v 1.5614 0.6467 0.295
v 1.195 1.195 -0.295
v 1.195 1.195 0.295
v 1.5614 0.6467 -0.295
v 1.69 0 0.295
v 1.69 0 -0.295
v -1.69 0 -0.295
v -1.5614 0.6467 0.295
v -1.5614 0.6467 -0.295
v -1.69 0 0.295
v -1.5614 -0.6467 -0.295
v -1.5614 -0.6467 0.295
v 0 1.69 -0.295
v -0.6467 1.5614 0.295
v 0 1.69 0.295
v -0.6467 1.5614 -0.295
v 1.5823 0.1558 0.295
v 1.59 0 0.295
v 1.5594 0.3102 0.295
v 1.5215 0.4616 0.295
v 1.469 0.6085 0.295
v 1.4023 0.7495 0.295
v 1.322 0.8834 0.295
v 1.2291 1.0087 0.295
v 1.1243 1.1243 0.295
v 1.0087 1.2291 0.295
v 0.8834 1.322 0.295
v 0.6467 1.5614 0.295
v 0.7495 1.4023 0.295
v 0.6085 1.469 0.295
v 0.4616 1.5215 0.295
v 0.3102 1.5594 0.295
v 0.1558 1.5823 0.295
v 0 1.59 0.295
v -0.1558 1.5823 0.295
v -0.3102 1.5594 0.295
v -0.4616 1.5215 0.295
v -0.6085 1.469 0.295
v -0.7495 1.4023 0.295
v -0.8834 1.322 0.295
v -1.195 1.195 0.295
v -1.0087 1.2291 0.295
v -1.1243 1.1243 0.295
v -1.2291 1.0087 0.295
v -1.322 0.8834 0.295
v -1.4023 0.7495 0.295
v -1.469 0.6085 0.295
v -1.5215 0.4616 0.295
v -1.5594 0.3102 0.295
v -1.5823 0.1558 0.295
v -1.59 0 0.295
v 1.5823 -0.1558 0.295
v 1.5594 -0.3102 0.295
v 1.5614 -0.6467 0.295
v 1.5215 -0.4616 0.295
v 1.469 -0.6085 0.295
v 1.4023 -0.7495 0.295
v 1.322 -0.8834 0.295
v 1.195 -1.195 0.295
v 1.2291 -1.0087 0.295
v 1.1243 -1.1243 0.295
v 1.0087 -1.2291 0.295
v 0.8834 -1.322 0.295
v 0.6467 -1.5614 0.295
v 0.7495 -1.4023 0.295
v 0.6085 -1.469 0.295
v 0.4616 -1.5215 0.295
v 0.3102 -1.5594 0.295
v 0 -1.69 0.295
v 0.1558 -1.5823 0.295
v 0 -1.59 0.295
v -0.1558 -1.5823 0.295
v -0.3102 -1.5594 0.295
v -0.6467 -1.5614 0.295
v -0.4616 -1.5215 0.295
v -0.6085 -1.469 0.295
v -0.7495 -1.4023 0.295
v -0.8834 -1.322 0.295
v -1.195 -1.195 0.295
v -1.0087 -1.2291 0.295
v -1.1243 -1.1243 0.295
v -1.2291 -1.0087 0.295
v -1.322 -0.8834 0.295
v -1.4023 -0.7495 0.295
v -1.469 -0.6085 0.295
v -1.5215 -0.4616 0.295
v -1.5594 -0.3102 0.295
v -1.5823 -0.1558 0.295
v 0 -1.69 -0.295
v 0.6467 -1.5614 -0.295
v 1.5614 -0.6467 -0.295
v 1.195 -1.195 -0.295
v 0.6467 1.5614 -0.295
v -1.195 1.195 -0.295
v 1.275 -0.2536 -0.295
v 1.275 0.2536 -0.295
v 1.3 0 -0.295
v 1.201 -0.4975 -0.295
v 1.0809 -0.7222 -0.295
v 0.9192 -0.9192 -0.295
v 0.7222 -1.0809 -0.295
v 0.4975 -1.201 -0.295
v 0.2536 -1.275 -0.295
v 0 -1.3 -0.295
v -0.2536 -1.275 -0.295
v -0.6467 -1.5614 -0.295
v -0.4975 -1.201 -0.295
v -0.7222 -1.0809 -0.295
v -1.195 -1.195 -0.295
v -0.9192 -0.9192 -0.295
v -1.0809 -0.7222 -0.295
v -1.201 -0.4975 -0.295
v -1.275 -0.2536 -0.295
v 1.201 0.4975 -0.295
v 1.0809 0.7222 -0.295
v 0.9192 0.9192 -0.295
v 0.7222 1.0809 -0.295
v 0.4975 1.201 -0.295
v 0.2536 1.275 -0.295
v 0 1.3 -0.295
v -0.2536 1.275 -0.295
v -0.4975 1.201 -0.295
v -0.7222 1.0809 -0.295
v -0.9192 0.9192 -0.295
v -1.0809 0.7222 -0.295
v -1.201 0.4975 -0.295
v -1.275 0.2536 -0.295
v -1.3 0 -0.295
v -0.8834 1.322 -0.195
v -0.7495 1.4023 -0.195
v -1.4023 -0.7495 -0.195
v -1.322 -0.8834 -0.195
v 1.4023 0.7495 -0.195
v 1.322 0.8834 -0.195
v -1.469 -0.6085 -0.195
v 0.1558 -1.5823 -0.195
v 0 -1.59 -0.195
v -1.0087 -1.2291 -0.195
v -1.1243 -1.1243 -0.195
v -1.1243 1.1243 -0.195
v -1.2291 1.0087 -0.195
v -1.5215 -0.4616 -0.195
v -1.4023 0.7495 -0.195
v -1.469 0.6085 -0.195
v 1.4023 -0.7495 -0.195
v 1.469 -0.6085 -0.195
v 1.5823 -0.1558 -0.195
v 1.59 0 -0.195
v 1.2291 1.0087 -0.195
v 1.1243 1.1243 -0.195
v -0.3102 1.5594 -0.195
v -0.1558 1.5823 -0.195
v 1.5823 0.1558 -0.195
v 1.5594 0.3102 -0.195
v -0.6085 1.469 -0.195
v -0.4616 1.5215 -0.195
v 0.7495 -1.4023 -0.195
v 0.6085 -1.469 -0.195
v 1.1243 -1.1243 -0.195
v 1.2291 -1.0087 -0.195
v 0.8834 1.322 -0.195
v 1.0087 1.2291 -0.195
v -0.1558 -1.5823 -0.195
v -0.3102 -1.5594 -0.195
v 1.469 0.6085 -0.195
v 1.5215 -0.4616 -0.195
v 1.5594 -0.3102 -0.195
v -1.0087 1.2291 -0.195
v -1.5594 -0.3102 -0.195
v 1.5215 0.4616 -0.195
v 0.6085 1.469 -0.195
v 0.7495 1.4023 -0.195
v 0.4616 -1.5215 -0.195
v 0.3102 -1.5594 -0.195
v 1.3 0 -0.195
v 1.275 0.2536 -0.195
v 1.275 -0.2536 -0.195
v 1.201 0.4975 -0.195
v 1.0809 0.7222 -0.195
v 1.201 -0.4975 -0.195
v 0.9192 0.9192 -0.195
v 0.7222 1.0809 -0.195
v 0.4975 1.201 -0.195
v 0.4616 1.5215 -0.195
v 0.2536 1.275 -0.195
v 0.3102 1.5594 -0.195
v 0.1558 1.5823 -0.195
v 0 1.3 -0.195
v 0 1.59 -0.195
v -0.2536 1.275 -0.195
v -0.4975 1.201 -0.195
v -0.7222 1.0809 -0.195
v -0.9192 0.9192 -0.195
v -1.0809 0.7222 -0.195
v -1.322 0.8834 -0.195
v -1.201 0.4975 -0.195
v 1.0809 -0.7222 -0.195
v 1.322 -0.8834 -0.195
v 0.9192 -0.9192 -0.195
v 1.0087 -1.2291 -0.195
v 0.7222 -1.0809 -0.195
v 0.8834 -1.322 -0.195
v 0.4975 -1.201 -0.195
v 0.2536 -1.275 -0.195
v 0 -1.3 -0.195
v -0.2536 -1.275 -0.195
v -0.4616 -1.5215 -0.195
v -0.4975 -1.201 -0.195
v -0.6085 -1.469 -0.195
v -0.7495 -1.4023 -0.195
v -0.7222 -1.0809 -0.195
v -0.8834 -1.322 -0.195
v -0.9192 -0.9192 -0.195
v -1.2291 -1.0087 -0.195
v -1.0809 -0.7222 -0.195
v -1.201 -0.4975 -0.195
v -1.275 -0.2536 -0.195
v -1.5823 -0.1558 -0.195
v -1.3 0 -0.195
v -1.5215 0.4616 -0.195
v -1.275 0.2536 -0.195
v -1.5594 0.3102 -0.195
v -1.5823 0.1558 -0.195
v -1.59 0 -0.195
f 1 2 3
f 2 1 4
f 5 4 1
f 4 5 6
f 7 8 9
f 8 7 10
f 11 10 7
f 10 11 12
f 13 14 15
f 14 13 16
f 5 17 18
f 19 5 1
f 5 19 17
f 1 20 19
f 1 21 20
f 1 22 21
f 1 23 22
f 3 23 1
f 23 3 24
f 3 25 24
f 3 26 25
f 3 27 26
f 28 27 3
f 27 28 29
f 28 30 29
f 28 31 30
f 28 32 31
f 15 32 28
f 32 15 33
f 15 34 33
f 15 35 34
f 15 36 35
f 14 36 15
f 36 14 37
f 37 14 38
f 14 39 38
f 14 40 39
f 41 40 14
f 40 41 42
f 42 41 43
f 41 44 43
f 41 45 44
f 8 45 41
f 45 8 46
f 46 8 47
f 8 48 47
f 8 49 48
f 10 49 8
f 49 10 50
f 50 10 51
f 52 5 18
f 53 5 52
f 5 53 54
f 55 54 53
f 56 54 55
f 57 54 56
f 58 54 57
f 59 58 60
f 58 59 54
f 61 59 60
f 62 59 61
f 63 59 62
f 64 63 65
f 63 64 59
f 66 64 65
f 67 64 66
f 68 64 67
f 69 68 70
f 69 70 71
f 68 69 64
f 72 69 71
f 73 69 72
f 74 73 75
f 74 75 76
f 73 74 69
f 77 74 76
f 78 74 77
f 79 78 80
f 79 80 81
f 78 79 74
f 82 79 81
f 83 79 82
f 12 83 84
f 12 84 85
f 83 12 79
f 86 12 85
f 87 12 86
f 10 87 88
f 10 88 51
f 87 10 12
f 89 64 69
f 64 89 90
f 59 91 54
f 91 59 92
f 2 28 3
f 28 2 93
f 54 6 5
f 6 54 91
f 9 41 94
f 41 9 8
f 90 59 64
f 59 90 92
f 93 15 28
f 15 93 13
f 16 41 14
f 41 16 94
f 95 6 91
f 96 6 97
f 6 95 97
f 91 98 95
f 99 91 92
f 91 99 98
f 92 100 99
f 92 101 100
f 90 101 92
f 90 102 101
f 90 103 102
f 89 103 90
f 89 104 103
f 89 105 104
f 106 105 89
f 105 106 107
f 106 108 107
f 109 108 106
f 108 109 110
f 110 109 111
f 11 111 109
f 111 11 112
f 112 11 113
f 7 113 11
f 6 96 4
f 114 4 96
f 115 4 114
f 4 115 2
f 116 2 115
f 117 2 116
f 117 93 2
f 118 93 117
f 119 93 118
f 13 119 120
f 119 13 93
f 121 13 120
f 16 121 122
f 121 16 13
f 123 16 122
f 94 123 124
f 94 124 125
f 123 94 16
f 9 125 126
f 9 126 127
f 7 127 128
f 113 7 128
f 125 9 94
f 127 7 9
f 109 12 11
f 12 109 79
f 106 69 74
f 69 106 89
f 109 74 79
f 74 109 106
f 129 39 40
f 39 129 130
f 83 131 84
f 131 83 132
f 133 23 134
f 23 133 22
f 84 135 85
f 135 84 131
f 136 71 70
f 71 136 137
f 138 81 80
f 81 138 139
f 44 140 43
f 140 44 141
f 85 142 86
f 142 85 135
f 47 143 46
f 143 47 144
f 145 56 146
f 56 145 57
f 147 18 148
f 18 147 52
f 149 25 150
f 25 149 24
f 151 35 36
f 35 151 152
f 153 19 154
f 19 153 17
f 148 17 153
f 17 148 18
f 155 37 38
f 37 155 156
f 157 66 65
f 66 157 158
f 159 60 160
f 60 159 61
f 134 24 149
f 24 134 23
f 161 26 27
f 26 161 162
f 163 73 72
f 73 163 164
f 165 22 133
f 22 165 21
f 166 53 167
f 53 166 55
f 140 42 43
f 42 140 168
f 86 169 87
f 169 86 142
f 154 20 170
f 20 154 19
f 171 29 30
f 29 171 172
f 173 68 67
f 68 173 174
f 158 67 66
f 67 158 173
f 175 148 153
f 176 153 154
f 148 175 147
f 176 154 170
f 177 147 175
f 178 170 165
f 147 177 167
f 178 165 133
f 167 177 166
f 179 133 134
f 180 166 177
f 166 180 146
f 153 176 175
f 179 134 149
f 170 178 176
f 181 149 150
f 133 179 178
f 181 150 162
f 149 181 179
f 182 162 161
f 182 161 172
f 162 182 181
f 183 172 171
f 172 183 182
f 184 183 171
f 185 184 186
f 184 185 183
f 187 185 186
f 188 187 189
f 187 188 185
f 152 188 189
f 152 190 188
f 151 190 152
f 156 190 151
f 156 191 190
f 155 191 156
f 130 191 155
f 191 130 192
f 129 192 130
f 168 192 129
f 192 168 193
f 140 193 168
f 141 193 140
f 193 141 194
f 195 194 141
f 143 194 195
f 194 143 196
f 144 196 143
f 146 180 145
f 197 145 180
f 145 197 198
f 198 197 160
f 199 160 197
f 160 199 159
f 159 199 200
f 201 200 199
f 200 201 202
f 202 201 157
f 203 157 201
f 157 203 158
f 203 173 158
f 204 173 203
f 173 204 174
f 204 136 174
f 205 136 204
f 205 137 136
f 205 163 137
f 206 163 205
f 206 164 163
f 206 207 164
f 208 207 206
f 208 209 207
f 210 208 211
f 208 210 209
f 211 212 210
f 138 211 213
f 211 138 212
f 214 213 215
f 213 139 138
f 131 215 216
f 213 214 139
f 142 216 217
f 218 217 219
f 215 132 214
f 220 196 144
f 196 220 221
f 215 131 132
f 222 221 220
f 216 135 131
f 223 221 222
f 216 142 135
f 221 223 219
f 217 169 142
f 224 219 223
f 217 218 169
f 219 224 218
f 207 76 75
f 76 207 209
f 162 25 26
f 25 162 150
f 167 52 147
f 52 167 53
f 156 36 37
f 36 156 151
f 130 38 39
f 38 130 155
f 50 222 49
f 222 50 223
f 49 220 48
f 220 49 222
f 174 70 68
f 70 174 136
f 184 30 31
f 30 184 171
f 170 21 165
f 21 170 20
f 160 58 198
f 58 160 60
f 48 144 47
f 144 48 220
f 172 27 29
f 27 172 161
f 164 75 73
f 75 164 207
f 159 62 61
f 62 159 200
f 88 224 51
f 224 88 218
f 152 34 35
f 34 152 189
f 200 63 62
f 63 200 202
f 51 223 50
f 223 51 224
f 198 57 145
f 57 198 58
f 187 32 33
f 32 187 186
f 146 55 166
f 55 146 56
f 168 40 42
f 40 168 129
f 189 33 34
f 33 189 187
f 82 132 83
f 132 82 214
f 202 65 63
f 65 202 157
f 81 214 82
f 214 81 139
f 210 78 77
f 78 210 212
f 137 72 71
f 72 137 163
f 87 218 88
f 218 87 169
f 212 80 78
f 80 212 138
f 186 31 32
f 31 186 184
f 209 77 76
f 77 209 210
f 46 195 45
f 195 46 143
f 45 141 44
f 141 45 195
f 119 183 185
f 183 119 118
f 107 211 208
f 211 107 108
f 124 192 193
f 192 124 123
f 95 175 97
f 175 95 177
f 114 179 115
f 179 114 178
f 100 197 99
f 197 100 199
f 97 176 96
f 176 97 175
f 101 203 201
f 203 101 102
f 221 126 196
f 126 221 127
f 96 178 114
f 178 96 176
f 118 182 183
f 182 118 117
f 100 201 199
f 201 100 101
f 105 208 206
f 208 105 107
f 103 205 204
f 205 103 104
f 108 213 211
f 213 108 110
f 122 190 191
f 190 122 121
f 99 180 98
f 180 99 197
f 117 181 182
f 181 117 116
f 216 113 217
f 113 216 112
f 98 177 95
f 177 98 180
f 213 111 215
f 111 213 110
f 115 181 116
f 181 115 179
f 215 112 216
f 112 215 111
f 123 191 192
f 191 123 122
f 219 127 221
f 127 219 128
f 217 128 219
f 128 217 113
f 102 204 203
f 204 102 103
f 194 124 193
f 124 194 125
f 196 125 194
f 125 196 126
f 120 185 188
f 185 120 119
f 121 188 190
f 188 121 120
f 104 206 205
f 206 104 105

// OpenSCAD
//Module filter retainer
//All parameters are in inches
     
//mfuniko wa chini/holder ya filter
difference(){
difference(){
    //mfuniko kasha
    cylinder(h = 0.59, r = 1.69,center = true, $fn=16);
    //inner side of the mfuniko where it mate with the cylinder and where the trades are/ smooth part
    translate([0,0,0.1]){
    cylinder(h = 0.59, r = 1.59, center = true, $fn=64);
    }
}
//hole to the mfuniko opening where it allows filted material to be discharged to
translate([0,0,-0.25]){
cylinder(h = 0.15, r = 1.3, center = true, $fn=32);
}
}//end of module filter retainer
